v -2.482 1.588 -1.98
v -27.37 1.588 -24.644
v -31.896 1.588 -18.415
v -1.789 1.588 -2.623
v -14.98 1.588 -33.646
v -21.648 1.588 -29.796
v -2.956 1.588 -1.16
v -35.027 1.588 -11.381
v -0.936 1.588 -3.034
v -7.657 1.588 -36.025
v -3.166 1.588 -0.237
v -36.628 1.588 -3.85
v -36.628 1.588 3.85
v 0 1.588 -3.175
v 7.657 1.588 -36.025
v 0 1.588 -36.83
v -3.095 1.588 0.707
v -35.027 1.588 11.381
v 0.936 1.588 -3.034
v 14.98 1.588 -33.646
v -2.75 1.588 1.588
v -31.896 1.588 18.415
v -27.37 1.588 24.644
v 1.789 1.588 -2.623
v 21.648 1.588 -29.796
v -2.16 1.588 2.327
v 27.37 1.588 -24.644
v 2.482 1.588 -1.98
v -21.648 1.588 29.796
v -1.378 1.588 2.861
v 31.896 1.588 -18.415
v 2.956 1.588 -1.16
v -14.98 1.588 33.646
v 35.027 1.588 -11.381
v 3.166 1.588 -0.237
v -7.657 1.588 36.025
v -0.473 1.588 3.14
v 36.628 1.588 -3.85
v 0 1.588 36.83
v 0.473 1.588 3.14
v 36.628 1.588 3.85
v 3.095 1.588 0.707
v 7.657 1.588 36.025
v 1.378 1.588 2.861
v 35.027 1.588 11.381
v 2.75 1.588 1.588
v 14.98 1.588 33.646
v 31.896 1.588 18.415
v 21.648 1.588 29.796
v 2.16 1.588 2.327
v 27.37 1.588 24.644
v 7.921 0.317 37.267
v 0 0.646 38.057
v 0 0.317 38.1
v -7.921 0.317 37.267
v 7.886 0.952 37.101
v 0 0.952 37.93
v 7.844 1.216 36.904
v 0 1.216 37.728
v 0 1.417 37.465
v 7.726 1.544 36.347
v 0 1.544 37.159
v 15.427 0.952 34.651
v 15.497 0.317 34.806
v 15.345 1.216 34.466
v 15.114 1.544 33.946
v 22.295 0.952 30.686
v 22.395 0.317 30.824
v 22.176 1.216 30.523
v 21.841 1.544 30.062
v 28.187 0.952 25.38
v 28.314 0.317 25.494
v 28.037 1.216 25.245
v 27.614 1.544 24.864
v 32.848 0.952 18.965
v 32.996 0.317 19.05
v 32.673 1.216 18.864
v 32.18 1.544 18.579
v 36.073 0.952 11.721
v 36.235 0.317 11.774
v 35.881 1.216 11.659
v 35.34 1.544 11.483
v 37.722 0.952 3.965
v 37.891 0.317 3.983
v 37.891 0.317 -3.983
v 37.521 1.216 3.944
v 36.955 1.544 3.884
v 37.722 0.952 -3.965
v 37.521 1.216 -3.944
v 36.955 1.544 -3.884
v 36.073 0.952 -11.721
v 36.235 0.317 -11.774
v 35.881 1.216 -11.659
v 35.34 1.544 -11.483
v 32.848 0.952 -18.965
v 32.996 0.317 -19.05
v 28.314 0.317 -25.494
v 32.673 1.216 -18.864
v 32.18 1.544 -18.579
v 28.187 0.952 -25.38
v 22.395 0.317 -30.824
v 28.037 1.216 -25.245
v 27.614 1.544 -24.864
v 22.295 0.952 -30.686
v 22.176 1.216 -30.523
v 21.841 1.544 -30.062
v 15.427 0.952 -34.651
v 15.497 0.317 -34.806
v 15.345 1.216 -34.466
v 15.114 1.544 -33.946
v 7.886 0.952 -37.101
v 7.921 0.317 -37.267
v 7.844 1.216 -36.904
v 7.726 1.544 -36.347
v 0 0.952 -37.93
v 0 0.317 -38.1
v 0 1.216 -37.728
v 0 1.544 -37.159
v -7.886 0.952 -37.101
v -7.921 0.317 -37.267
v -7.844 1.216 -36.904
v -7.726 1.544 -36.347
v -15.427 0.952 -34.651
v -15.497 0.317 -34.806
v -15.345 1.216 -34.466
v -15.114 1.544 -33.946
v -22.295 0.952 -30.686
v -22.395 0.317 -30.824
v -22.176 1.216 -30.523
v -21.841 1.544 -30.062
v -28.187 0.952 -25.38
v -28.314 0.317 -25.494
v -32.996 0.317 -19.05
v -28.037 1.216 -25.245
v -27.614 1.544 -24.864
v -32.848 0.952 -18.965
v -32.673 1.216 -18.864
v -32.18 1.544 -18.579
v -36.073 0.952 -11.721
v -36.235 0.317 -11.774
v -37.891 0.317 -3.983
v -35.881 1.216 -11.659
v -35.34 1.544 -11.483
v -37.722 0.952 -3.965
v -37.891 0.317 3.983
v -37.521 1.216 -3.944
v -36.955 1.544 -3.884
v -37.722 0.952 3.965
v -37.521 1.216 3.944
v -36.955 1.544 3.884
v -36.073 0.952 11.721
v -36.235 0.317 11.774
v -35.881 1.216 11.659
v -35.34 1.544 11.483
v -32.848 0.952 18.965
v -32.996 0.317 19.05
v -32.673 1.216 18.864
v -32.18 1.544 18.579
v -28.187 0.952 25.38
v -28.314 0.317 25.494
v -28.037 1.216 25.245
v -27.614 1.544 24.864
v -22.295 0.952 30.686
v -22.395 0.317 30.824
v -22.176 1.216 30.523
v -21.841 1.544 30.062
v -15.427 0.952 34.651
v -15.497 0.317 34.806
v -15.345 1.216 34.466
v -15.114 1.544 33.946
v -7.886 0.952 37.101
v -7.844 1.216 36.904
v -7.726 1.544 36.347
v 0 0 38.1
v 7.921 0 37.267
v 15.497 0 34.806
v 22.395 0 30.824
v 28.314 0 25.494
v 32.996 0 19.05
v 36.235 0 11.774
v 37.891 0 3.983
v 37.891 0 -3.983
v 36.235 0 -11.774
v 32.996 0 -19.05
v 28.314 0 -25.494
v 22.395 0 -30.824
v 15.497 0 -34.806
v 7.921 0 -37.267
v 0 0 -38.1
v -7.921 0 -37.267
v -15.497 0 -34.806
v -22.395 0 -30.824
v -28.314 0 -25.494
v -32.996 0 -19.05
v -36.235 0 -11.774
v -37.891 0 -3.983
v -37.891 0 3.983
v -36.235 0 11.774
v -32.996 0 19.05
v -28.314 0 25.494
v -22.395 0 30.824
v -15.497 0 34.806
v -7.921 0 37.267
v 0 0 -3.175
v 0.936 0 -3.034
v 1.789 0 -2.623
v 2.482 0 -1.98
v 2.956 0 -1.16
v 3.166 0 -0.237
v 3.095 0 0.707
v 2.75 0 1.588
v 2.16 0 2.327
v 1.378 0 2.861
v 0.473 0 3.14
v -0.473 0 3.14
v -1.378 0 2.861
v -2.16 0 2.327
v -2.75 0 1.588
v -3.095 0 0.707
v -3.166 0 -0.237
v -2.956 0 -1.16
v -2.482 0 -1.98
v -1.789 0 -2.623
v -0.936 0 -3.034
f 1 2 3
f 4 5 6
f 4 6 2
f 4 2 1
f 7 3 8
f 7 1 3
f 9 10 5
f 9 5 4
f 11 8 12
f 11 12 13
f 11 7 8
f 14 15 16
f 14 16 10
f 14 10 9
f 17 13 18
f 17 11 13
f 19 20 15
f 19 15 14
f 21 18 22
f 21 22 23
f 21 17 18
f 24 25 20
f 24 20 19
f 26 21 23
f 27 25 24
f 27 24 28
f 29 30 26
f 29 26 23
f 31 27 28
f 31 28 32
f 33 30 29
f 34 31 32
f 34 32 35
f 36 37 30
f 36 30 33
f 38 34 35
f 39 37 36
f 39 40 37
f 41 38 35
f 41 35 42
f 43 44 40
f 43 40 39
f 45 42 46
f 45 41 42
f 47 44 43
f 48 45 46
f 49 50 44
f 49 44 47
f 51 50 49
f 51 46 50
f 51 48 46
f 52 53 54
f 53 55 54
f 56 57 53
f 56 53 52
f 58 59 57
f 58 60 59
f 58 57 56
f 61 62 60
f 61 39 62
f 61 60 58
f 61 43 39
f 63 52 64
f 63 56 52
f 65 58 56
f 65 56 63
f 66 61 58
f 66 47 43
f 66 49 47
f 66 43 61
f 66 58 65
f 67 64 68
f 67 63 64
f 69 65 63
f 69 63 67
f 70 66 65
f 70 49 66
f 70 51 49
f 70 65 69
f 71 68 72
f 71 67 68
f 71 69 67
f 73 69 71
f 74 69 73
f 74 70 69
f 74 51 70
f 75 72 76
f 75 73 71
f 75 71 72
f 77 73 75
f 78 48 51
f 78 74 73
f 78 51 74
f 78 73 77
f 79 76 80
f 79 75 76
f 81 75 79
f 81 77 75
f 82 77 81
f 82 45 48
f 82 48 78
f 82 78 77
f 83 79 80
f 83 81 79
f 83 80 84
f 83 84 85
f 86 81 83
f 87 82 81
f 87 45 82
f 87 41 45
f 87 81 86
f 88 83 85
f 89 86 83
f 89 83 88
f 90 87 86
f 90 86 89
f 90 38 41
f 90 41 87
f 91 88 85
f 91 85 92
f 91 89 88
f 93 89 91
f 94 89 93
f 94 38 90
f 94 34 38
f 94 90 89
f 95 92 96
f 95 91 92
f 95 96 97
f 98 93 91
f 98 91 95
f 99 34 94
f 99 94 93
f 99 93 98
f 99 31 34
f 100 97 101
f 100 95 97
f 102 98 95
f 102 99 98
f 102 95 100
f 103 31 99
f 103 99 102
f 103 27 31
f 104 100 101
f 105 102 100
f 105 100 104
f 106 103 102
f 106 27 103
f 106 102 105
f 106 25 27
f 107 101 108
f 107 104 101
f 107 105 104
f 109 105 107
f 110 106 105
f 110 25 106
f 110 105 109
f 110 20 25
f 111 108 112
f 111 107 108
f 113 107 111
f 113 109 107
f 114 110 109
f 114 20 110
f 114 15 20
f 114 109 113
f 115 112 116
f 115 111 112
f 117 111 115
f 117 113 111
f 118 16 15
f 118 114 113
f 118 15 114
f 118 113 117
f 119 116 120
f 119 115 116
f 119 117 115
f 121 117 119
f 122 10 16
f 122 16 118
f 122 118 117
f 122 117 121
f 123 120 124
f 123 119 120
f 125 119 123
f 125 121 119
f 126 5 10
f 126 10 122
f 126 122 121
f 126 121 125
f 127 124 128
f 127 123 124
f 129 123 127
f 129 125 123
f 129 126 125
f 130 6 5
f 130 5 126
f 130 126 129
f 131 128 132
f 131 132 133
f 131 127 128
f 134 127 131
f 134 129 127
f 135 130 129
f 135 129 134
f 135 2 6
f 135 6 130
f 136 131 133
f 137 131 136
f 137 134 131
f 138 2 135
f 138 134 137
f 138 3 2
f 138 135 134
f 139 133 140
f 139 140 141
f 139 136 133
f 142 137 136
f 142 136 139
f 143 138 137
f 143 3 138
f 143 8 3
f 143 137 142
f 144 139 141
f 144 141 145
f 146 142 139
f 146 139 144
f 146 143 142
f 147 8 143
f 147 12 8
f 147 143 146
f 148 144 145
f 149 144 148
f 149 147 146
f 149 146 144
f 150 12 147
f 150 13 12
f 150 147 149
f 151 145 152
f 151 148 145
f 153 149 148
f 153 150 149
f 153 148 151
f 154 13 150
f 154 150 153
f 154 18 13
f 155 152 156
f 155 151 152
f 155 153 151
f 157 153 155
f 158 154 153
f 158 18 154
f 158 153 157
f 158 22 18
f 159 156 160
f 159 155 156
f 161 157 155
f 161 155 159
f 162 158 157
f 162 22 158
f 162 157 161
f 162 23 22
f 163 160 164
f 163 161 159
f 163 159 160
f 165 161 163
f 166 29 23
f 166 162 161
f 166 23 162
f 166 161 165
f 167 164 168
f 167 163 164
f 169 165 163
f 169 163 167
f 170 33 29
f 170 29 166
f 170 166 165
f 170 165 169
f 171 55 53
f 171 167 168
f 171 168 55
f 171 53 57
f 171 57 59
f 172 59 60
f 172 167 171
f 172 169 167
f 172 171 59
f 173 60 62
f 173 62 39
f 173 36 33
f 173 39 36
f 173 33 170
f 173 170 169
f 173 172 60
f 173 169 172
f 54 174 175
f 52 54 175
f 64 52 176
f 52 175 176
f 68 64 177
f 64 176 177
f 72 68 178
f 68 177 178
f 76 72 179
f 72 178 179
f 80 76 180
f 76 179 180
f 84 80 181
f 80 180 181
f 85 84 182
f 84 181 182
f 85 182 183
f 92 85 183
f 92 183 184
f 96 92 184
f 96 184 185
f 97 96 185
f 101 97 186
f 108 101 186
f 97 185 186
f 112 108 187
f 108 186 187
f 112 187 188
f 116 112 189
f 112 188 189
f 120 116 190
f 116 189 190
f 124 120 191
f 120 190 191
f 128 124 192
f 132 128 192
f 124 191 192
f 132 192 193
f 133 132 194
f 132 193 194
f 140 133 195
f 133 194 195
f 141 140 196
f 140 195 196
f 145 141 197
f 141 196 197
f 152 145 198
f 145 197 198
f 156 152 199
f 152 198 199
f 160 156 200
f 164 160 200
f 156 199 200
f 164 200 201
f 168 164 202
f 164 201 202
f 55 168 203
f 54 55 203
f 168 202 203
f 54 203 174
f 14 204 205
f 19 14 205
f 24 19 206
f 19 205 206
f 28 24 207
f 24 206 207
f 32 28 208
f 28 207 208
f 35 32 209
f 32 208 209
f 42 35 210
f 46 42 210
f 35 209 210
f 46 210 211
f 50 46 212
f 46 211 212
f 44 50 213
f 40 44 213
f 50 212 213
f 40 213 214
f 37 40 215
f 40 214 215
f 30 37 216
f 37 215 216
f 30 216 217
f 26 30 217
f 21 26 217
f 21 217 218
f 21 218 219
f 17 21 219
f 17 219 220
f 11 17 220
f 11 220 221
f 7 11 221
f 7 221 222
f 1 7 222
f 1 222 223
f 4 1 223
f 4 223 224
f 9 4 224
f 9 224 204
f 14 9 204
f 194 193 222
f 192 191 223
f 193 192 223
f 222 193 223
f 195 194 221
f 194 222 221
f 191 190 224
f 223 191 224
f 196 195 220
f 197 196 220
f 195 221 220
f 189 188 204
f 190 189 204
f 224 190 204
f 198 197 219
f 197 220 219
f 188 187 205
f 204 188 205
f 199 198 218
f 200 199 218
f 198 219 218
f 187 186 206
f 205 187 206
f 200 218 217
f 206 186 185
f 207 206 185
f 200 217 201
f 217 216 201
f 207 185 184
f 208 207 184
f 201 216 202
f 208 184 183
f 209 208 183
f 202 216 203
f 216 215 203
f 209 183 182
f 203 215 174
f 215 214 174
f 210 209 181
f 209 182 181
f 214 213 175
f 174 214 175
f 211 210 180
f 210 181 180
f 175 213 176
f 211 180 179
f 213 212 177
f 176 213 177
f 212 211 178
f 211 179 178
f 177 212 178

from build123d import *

# Parameters (mm, degrees)
SKETCH1_R           = 38.1
BOSS_EXTRUDE1_DEPTH = 1.5875
FILLET1_R           = 1.27
SKETCH2_R           = 3.175
CUT_EXTRUDE1_DEPTH  = 54.904917737


with BuildPart() as part:
    # Sketch1 → Boss-Extrude1 (new body)
    with BuildSketch(Plane(origin=(0, 0, 0), x_dir=(1, 0, 0), z_dir=(0, 1, 0))):
        with Locations(Location((0, 0, 0), (0, 0, 270))):
            Circle(SKETCH1_R)
    extrude(amount=BOSS_EXTRUDE1_DEPTH)

    # Fillet1
    fillet1_edges = [part.edges().sort_by_distance(p)[0] for p in [
        (0, 1.5875, -38.1),
    ]]
    fillet(fillet1_edges, radius=FILLET1_R)

    # Sketch2 → Cut-Extrude1 (cut, through all)
    with BuildSketch(Plane.XZ):
        with Locations(Location((0, 0, 0), (0, 0, 270))):
            Circle(SKETCH2_R)
    extrude(amount=-CUT_EXTRUDE1_DEPTH, mode=Mode.SUBTRACT)


solid = part.part
